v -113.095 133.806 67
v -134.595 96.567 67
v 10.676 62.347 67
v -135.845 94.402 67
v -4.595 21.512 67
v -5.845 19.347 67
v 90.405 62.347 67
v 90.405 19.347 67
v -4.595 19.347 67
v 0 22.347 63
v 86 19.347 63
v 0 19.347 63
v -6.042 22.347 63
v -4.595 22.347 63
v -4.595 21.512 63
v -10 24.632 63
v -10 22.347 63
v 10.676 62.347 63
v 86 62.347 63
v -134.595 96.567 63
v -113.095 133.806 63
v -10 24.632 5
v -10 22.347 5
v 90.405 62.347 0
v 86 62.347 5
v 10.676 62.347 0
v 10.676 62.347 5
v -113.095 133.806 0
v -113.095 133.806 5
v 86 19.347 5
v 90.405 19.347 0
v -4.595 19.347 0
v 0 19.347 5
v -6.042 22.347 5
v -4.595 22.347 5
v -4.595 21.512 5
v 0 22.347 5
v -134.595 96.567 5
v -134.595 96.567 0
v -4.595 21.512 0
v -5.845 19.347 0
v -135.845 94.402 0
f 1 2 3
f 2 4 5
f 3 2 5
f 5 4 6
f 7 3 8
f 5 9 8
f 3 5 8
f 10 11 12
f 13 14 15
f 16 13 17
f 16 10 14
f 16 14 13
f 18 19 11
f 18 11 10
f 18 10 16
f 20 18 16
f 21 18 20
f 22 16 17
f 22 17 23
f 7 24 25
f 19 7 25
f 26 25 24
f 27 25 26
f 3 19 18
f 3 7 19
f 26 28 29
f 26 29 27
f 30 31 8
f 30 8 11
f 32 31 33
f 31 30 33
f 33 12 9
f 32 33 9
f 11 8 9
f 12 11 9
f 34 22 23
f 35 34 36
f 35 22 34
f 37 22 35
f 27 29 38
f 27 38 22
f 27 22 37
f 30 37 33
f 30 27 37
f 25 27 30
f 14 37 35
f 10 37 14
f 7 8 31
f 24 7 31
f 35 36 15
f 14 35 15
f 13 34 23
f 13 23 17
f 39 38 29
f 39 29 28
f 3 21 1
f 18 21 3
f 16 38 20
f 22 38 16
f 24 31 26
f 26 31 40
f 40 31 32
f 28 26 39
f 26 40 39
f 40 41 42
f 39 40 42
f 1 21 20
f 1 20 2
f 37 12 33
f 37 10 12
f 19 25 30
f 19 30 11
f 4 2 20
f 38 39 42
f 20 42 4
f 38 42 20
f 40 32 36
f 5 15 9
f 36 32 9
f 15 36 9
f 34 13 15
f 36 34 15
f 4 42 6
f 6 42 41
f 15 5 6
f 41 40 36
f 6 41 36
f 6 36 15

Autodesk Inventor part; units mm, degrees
ref_plane "YZ Plane" through (0, 0, 0) normal (1, 0, 0) x (0, 1, 0)
ref_plane "XY Plane" through (0, 0, 0) normal (0, 0, 1) x (1, 0, 0)
sketch "Sketch1" plane through (0, 0, 0) normal (0, 0, 1) x (1, 0, 0)
  line L0 (-135.8451, 94.4022) -> (-5.8451, 19.3467)
  line L1 (-134.5951, 96.5673) -> (-4.5951, 21.5118)
  line L2 (-4.5951, 21.5118) -> (-5.8451, 19.3467)
  line L3 (-134.5951, 96.5673) -> (-135.8451, 94.4022)
  line L4 (-164.6473, 0) -> (36.9683, 0) projected
  point P0 (0, 0)
  dimension "d0" = 2.5
  dimension "d3" = 130
  dimension "d4" = 30
extrude "Extrusion1" add sketch "Sketch1" along normal blind 67
sketch "Sketch2" plane through (-134.5951, 96.5673, 67) normal (0.5, 0.866, 0) x (0.866, -0.5, 0)
  point P0 (164.8464, 67)
sketch "Sketch4" plane through (0, 0, 67) normal (0, 0, 1) x (1, 0, 0)
  point P0 (0, 0)
sketch "Sketch5" plane through (-134.5951, 96.5673, 67) normal (0.5, 0.866, 0) x (0.866, -0.5, 0)
  line L0 (0, 67) -> (0, 0) projected
  line L1 (0, 0) -> (152, 0)
  line L2 (152, 0) -> (152, 4)
  line L3 (152, 4) -> (0, 4)
  line L4 (0, 4) -> (0, 0)
  point P0 (164.8464, 67)
  point P1 (0, 4)
sketch "Sketch6" plane through (-134.5951, 96.5673, 67) normal (0.5, 0.866, 0) x (0.866, -0.5, 0)
  line L0 (0, 67) -> (150.1111, 67) projected
  line L1 (0, 67) -> (150.1111, 67)
  line L2 (150.1111, 67) -> (150.1111, 62)
  line L3 (150.1111, 62) -> (0, 62)
  line L4 (0, 62) -> (0, 67)
  point P0 (164.8464, 67)
extrude "Extrusion2" add sketch "Sketch5" along normal blind 43
extrude "Extrusion3" add sketch "Sketch6" along normal blind 43
ref_plane "Work Plane1" through (0, 19.347, 0) normal (0, 1, 0) x (-1, 0, 0)
sketch "Sketch8" plane through (0, 19.347, 0) normal (0, 1, 0) x (-1, 0, 0)
  line L0 (5.8451, 67) -> (4.5951, 67) projected
  line L1 (4.5951, 67) -> (-90.4049, 67)
  line L2 (-90.4049, 67) -> (-90.4049, 0)
  line L3 (-90.4049, 0) -> (4.5951, 0)
  line L4 (4.5951, 0) -> (4.5951, 67)
  point P0 (0, 0)
  dimension "d10" = 95
extrude "Extrusion4" add sketch "Sketch8" along normal blind 43
sketch "Sketch9" plane through (0, 62.347, 0) normal (0, 1, 0) x (1, 0, 0)
  line L0 (-113.0951, -5) -> (10.6762, -5) projected
  line L1 (0, -5) -> (86, -5)
  line L2 (86, -5) -> (86, -63)
  line L3 (86, -63) -> (0, -63)
  line L4 (0, -63) -> (0, -5)
  point P0 (0, 0)
extrude "Extrusion5" cut sketch "Sketch9" against normal through all
sketch "Sketch12" plane through (0, 62.347, 63) normal (1, 0, 0) x (0, 0, -1)
  line L0 (-4, 0) -> (0, 0) projected
  line L1 (58, 0) -> (58, -43) projected
  line L2 (0, 0) -> (58, 0)
  line L3 (58, 0) -> (58, -40)
  line L4 (58, -40) -> (0, -40)
  line L5 (0, -40) -> (0, 0)
  point P0 (63, -62.347)
extrude "Extrusion6" cut sketch "Sketch12" against normal blind 10
properties part number "channel"
